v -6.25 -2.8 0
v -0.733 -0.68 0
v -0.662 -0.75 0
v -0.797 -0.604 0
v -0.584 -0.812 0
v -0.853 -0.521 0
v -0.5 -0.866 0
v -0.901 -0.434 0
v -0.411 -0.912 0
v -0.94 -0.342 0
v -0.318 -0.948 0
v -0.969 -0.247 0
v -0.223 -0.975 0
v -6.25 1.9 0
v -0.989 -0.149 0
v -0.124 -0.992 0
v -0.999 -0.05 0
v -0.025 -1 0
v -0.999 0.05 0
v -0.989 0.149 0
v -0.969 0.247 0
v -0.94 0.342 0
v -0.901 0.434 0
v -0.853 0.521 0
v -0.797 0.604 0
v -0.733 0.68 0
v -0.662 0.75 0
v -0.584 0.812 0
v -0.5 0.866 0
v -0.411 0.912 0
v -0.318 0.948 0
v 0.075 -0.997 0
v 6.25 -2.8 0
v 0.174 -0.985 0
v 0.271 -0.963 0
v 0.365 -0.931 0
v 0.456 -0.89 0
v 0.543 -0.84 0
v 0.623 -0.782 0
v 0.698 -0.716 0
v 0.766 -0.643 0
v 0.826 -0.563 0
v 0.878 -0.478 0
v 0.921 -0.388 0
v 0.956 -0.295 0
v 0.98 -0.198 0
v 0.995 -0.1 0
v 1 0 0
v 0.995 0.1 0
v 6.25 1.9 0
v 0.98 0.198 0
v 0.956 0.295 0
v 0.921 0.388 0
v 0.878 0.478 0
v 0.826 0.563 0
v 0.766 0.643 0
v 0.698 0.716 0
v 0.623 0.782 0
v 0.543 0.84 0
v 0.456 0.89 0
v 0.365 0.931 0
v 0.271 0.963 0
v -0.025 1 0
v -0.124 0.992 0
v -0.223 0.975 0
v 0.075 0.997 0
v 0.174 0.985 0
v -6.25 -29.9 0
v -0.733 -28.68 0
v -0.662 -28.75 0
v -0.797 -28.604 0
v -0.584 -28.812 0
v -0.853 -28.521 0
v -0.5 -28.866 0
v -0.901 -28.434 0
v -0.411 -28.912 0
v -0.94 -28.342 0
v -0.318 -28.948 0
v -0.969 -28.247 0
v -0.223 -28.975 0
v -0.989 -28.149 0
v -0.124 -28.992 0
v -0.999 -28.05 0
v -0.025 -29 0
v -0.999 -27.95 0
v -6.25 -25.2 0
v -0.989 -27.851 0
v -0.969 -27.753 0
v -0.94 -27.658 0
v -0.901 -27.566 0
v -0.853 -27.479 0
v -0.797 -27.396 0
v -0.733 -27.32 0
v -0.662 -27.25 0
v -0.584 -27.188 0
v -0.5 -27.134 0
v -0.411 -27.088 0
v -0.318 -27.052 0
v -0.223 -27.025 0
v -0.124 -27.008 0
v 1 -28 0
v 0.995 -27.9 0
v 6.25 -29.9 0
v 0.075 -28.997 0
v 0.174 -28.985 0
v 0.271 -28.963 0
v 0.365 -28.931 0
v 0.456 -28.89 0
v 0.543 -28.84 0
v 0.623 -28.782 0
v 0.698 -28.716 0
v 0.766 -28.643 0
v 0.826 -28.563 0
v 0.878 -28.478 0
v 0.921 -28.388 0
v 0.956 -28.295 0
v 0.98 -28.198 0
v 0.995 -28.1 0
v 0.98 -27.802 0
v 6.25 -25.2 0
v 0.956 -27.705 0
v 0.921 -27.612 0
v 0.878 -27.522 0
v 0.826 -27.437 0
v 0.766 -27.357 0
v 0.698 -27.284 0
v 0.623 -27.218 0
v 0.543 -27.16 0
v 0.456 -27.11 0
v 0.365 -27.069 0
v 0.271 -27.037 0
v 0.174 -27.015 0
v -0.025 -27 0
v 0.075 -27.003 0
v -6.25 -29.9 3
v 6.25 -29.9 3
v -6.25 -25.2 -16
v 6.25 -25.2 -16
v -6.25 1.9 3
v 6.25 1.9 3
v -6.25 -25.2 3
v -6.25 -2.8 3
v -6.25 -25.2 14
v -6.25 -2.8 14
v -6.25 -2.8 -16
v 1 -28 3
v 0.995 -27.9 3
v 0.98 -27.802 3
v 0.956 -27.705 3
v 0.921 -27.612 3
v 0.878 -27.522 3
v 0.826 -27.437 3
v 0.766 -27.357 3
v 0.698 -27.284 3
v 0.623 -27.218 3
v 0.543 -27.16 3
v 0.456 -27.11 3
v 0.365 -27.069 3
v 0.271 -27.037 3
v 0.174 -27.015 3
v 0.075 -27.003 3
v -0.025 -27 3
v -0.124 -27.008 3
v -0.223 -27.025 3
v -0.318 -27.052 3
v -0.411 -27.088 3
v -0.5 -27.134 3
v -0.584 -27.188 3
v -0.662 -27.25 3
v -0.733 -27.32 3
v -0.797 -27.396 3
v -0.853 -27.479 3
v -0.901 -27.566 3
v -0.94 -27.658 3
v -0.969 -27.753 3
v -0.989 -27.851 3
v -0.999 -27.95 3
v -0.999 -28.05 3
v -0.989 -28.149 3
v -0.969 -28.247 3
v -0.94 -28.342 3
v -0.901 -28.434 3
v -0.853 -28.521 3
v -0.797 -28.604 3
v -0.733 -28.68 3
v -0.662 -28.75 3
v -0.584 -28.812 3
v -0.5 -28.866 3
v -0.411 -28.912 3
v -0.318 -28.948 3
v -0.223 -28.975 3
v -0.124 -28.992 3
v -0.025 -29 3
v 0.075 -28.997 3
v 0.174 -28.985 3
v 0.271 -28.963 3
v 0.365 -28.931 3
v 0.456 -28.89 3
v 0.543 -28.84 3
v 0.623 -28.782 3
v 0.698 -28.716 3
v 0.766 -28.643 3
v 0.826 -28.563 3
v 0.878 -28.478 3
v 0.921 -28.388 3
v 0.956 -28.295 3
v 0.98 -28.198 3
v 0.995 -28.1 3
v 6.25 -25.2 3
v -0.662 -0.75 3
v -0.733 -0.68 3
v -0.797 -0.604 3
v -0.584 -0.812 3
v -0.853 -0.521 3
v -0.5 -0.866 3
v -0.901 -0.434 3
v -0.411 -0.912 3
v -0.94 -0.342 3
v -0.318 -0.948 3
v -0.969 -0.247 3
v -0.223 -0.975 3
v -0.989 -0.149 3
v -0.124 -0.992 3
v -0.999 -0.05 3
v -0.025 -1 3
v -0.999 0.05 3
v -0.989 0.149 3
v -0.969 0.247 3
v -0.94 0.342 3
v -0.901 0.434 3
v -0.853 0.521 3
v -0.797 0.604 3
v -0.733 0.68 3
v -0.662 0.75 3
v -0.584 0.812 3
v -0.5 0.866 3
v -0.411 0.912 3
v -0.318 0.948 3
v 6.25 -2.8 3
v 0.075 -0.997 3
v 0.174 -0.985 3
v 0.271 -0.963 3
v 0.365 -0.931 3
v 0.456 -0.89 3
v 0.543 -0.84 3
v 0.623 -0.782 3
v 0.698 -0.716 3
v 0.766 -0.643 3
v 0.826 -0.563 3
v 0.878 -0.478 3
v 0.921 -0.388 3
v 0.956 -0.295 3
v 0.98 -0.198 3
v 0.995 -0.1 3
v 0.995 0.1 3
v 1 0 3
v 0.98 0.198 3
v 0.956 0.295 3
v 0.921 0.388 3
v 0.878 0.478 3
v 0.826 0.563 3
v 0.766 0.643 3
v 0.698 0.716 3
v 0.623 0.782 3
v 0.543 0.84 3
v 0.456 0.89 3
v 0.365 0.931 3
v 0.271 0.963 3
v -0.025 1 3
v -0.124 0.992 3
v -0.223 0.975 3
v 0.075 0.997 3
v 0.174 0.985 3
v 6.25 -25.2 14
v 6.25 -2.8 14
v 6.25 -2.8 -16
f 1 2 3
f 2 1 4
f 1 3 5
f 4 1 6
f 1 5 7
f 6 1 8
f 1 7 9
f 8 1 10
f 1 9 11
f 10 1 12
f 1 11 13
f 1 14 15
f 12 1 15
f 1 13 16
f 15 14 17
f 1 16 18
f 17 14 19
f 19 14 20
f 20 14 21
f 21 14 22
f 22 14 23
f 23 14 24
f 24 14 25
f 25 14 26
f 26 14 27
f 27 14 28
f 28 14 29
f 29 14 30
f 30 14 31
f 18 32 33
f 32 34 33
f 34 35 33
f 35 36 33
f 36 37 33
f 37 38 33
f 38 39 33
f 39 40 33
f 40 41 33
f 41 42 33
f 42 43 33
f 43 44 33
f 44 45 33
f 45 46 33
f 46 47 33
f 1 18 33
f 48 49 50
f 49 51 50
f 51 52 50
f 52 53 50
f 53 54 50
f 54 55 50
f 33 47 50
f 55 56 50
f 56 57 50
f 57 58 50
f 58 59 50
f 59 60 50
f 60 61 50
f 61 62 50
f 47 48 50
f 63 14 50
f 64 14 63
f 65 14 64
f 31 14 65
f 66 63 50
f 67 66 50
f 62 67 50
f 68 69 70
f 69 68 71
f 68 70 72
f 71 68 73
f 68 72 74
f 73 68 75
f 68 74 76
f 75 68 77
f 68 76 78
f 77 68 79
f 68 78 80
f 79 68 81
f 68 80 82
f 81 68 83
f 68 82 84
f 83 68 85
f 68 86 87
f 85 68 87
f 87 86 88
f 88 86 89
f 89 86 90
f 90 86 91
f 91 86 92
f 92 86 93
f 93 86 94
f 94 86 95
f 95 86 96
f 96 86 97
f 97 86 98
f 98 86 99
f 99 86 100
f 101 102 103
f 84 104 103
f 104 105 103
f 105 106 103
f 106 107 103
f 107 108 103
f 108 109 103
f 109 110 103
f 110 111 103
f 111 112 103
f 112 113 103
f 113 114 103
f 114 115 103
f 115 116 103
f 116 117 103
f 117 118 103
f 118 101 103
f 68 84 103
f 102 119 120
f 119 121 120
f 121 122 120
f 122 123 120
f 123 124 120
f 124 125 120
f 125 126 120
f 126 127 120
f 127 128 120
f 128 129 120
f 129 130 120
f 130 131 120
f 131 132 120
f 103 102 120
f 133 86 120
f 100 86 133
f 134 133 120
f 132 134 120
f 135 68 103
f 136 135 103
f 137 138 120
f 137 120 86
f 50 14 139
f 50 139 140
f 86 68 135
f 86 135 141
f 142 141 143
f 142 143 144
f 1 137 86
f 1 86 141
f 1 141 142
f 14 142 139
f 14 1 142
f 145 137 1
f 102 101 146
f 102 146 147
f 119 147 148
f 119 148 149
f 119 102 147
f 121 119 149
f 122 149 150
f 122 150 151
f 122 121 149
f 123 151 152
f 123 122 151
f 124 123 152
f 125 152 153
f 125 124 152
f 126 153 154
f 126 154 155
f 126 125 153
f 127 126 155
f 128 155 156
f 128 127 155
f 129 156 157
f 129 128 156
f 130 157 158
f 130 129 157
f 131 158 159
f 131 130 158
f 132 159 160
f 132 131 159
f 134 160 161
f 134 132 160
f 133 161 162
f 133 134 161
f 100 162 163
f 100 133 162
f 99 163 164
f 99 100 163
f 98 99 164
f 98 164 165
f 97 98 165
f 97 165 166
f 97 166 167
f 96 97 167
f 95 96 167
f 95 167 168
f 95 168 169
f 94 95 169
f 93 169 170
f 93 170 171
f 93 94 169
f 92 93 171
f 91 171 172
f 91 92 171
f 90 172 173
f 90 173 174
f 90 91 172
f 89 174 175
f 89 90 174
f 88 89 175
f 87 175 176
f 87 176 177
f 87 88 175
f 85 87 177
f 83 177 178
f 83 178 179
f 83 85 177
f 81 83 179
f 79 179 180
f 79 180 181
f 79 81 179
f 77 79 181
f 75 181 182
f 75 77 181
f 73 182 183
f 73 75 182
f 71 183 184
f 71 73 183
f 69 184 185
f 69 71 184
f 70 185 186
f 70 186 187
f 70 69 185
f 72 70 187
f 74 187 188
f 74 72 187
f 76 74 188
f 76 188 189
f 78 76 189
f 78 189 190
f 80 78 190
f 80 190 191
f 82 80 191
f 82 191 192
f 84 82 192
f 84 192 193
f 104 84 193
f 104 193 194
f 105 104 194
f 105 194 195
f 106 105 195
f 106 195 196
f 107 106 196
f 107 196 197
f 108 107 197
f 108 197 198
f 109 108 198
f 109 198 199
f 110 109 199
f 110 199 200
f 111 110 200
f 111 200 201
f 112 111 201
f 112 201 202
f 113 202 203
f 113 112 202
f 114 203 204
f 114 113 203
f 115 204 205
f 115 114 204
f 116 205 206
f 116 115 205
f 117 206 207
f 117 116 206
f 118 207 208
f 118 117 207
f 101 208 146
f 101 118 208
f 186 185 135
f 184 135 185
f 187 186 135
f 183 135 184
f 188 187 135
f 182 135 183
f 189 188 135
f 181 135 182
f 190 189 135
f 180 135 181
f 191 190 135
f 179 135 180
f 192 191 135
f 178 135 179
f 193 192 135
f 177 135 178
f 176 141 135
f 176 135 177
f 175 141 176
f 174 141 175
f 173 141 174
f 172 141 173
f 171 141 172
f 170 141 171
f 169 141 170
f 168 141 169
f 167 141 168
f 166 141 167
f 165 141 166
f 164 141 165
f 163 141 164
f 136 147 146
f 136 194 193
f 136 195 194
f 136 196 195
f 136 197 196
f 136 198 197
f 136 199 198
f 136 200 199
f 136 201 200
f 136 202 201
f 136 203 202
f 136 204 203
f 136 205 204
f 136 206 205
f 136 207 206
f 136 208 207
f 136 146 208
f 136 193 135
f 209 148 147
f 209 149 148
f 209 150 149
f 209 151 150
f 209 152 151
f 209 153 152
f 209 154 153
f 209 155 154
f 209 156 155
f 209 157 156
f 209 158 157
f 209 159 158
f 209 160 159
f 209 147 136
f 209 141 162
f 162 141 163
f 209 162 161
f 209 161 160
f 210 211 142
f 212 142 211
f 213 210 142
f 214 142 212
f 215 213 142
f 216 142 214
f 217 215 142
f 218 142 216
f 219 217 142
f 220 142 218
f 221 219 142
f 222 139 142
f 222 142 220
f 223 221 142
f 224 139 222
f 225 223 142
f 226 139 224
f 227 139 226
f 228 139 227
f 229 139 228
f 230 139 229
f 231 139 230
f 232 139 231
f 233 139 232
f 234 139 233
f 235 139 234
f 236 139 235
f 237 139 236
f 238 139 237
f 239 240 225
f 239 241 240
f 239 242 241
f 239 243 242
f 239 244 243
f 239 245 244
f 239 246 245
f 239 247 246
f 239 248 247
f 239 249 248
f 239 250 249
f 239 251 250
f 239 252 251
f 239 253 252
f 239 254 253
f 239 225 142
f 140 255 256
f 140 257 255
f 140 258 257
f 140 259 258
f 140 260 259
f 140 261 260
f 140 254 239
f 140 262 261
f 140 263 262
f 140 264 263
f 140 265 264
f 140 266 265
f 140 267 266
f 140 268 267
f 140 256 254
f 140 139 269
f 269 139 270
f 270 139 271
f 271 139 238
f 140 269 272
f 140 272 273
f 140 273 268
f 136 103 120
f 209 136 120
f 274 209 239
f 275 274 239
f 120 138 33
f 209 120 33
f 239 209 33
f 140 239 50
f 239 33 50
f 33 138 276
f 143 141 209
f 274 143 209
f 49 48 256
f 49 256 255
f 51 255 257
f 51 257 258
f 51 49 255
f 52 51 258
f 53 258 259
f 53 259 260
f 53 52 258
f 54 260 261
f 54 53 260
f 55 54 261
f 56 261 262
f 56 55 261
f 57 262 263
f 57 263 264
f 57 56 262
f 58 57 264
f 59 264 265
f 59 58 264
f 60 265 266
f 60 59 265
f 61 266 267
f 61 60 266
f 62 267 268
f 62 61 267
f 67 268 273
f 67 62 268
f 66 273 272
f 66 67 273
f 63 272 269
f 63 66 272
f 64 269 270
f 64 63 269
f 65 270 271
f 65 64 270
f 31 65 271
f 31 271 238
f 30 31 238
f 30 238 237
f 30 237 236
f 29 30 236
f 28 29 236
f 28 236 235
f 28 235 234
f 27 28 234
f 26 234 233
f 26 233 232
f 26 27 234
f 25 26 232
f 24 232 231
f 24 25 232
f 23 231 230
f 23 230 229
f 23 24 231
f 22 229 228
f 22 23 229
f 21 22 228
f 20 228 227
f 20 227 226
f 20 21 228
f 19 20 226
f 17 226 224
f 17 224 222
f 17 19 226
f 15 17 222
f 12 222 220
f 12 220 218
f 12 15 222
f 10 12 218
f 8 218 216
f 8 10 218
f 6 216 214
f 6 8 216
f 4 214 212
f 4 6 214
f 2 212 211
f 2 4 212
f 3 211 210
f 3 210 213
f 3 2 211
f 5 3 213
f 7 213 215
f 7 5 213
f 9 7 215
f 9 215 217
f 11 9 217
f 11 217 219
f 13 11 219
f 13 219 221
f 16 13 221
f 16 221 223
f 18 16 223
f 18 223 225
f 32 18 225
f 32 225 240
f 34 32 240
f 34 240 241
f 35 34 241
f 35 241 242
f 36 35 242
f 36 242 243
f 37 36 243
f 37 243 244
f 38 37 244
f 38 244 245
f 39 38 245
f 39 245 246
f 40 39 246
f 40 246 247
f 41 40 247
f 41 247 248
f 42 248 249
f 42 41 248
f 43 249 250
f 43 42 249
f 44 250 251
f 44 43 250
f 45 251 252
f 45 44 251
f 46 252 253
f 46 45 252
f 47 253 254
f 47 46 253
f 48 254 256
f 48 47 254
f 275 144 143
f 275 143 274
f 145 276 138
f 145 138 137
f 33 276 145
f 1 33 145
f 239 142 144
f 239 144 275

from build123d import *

# Parameters (mm, degrees)
SKETCH_1_W      = 12.5
SKETCH_1_H      = 31.8
SKETCH_1_R      = 1
EXTRUDE_1_DEPTH = 3
SKETCH_2_W      = 12.5
SKETCH_2_H      = 22.4
EXTRUDE_2_DEPTH = 11
SKETCH_3_W      = 12.5
SKETCH_3_H      = 22.4
EXTRUDE_4_DEPTH = 16


with BuildPart() as part:
    # 草图1 → 凸台-拉伸1 (new body)
    with BuildSketch(Plane.XY):
        with Locations((0, -14)):
            Rectangle(SKETCH_1_W, SKETCH_1_H)
        Circle(SKETCH_1_R, mode=Mode.SUBTRACT)
        with Locations((0, -28)):
            Circle(SKETCH_1_R, mode=Mode.SUBTRACT)
    extrude(amount=EXTRUDE_1_DEPTH)

    # 草图2 → 凸台-拉伸2 (add)
    with BuildSketch(Plane.XY.offset(3)):
        with Locations((0, -14)):
            Rectangle(SKETCH_2_W, SKETCH_2_H)
    extrude(amount=EXTRUDE_2_DEPTH)

    # 草图3 → 凸台-拉伸4 (add)
    with BuildSketch(Plane(origin=(0, 0, 0), x_dir=(-1, 0, 0), z_dir=(0, 0, -1))):
        with Locations((0, -14)):
            Rectangle(SKETCH_3_W, SKETCH_3_H)
    extrude(amount=EXTRUDE_4_DEPTH)


solid = part.part
